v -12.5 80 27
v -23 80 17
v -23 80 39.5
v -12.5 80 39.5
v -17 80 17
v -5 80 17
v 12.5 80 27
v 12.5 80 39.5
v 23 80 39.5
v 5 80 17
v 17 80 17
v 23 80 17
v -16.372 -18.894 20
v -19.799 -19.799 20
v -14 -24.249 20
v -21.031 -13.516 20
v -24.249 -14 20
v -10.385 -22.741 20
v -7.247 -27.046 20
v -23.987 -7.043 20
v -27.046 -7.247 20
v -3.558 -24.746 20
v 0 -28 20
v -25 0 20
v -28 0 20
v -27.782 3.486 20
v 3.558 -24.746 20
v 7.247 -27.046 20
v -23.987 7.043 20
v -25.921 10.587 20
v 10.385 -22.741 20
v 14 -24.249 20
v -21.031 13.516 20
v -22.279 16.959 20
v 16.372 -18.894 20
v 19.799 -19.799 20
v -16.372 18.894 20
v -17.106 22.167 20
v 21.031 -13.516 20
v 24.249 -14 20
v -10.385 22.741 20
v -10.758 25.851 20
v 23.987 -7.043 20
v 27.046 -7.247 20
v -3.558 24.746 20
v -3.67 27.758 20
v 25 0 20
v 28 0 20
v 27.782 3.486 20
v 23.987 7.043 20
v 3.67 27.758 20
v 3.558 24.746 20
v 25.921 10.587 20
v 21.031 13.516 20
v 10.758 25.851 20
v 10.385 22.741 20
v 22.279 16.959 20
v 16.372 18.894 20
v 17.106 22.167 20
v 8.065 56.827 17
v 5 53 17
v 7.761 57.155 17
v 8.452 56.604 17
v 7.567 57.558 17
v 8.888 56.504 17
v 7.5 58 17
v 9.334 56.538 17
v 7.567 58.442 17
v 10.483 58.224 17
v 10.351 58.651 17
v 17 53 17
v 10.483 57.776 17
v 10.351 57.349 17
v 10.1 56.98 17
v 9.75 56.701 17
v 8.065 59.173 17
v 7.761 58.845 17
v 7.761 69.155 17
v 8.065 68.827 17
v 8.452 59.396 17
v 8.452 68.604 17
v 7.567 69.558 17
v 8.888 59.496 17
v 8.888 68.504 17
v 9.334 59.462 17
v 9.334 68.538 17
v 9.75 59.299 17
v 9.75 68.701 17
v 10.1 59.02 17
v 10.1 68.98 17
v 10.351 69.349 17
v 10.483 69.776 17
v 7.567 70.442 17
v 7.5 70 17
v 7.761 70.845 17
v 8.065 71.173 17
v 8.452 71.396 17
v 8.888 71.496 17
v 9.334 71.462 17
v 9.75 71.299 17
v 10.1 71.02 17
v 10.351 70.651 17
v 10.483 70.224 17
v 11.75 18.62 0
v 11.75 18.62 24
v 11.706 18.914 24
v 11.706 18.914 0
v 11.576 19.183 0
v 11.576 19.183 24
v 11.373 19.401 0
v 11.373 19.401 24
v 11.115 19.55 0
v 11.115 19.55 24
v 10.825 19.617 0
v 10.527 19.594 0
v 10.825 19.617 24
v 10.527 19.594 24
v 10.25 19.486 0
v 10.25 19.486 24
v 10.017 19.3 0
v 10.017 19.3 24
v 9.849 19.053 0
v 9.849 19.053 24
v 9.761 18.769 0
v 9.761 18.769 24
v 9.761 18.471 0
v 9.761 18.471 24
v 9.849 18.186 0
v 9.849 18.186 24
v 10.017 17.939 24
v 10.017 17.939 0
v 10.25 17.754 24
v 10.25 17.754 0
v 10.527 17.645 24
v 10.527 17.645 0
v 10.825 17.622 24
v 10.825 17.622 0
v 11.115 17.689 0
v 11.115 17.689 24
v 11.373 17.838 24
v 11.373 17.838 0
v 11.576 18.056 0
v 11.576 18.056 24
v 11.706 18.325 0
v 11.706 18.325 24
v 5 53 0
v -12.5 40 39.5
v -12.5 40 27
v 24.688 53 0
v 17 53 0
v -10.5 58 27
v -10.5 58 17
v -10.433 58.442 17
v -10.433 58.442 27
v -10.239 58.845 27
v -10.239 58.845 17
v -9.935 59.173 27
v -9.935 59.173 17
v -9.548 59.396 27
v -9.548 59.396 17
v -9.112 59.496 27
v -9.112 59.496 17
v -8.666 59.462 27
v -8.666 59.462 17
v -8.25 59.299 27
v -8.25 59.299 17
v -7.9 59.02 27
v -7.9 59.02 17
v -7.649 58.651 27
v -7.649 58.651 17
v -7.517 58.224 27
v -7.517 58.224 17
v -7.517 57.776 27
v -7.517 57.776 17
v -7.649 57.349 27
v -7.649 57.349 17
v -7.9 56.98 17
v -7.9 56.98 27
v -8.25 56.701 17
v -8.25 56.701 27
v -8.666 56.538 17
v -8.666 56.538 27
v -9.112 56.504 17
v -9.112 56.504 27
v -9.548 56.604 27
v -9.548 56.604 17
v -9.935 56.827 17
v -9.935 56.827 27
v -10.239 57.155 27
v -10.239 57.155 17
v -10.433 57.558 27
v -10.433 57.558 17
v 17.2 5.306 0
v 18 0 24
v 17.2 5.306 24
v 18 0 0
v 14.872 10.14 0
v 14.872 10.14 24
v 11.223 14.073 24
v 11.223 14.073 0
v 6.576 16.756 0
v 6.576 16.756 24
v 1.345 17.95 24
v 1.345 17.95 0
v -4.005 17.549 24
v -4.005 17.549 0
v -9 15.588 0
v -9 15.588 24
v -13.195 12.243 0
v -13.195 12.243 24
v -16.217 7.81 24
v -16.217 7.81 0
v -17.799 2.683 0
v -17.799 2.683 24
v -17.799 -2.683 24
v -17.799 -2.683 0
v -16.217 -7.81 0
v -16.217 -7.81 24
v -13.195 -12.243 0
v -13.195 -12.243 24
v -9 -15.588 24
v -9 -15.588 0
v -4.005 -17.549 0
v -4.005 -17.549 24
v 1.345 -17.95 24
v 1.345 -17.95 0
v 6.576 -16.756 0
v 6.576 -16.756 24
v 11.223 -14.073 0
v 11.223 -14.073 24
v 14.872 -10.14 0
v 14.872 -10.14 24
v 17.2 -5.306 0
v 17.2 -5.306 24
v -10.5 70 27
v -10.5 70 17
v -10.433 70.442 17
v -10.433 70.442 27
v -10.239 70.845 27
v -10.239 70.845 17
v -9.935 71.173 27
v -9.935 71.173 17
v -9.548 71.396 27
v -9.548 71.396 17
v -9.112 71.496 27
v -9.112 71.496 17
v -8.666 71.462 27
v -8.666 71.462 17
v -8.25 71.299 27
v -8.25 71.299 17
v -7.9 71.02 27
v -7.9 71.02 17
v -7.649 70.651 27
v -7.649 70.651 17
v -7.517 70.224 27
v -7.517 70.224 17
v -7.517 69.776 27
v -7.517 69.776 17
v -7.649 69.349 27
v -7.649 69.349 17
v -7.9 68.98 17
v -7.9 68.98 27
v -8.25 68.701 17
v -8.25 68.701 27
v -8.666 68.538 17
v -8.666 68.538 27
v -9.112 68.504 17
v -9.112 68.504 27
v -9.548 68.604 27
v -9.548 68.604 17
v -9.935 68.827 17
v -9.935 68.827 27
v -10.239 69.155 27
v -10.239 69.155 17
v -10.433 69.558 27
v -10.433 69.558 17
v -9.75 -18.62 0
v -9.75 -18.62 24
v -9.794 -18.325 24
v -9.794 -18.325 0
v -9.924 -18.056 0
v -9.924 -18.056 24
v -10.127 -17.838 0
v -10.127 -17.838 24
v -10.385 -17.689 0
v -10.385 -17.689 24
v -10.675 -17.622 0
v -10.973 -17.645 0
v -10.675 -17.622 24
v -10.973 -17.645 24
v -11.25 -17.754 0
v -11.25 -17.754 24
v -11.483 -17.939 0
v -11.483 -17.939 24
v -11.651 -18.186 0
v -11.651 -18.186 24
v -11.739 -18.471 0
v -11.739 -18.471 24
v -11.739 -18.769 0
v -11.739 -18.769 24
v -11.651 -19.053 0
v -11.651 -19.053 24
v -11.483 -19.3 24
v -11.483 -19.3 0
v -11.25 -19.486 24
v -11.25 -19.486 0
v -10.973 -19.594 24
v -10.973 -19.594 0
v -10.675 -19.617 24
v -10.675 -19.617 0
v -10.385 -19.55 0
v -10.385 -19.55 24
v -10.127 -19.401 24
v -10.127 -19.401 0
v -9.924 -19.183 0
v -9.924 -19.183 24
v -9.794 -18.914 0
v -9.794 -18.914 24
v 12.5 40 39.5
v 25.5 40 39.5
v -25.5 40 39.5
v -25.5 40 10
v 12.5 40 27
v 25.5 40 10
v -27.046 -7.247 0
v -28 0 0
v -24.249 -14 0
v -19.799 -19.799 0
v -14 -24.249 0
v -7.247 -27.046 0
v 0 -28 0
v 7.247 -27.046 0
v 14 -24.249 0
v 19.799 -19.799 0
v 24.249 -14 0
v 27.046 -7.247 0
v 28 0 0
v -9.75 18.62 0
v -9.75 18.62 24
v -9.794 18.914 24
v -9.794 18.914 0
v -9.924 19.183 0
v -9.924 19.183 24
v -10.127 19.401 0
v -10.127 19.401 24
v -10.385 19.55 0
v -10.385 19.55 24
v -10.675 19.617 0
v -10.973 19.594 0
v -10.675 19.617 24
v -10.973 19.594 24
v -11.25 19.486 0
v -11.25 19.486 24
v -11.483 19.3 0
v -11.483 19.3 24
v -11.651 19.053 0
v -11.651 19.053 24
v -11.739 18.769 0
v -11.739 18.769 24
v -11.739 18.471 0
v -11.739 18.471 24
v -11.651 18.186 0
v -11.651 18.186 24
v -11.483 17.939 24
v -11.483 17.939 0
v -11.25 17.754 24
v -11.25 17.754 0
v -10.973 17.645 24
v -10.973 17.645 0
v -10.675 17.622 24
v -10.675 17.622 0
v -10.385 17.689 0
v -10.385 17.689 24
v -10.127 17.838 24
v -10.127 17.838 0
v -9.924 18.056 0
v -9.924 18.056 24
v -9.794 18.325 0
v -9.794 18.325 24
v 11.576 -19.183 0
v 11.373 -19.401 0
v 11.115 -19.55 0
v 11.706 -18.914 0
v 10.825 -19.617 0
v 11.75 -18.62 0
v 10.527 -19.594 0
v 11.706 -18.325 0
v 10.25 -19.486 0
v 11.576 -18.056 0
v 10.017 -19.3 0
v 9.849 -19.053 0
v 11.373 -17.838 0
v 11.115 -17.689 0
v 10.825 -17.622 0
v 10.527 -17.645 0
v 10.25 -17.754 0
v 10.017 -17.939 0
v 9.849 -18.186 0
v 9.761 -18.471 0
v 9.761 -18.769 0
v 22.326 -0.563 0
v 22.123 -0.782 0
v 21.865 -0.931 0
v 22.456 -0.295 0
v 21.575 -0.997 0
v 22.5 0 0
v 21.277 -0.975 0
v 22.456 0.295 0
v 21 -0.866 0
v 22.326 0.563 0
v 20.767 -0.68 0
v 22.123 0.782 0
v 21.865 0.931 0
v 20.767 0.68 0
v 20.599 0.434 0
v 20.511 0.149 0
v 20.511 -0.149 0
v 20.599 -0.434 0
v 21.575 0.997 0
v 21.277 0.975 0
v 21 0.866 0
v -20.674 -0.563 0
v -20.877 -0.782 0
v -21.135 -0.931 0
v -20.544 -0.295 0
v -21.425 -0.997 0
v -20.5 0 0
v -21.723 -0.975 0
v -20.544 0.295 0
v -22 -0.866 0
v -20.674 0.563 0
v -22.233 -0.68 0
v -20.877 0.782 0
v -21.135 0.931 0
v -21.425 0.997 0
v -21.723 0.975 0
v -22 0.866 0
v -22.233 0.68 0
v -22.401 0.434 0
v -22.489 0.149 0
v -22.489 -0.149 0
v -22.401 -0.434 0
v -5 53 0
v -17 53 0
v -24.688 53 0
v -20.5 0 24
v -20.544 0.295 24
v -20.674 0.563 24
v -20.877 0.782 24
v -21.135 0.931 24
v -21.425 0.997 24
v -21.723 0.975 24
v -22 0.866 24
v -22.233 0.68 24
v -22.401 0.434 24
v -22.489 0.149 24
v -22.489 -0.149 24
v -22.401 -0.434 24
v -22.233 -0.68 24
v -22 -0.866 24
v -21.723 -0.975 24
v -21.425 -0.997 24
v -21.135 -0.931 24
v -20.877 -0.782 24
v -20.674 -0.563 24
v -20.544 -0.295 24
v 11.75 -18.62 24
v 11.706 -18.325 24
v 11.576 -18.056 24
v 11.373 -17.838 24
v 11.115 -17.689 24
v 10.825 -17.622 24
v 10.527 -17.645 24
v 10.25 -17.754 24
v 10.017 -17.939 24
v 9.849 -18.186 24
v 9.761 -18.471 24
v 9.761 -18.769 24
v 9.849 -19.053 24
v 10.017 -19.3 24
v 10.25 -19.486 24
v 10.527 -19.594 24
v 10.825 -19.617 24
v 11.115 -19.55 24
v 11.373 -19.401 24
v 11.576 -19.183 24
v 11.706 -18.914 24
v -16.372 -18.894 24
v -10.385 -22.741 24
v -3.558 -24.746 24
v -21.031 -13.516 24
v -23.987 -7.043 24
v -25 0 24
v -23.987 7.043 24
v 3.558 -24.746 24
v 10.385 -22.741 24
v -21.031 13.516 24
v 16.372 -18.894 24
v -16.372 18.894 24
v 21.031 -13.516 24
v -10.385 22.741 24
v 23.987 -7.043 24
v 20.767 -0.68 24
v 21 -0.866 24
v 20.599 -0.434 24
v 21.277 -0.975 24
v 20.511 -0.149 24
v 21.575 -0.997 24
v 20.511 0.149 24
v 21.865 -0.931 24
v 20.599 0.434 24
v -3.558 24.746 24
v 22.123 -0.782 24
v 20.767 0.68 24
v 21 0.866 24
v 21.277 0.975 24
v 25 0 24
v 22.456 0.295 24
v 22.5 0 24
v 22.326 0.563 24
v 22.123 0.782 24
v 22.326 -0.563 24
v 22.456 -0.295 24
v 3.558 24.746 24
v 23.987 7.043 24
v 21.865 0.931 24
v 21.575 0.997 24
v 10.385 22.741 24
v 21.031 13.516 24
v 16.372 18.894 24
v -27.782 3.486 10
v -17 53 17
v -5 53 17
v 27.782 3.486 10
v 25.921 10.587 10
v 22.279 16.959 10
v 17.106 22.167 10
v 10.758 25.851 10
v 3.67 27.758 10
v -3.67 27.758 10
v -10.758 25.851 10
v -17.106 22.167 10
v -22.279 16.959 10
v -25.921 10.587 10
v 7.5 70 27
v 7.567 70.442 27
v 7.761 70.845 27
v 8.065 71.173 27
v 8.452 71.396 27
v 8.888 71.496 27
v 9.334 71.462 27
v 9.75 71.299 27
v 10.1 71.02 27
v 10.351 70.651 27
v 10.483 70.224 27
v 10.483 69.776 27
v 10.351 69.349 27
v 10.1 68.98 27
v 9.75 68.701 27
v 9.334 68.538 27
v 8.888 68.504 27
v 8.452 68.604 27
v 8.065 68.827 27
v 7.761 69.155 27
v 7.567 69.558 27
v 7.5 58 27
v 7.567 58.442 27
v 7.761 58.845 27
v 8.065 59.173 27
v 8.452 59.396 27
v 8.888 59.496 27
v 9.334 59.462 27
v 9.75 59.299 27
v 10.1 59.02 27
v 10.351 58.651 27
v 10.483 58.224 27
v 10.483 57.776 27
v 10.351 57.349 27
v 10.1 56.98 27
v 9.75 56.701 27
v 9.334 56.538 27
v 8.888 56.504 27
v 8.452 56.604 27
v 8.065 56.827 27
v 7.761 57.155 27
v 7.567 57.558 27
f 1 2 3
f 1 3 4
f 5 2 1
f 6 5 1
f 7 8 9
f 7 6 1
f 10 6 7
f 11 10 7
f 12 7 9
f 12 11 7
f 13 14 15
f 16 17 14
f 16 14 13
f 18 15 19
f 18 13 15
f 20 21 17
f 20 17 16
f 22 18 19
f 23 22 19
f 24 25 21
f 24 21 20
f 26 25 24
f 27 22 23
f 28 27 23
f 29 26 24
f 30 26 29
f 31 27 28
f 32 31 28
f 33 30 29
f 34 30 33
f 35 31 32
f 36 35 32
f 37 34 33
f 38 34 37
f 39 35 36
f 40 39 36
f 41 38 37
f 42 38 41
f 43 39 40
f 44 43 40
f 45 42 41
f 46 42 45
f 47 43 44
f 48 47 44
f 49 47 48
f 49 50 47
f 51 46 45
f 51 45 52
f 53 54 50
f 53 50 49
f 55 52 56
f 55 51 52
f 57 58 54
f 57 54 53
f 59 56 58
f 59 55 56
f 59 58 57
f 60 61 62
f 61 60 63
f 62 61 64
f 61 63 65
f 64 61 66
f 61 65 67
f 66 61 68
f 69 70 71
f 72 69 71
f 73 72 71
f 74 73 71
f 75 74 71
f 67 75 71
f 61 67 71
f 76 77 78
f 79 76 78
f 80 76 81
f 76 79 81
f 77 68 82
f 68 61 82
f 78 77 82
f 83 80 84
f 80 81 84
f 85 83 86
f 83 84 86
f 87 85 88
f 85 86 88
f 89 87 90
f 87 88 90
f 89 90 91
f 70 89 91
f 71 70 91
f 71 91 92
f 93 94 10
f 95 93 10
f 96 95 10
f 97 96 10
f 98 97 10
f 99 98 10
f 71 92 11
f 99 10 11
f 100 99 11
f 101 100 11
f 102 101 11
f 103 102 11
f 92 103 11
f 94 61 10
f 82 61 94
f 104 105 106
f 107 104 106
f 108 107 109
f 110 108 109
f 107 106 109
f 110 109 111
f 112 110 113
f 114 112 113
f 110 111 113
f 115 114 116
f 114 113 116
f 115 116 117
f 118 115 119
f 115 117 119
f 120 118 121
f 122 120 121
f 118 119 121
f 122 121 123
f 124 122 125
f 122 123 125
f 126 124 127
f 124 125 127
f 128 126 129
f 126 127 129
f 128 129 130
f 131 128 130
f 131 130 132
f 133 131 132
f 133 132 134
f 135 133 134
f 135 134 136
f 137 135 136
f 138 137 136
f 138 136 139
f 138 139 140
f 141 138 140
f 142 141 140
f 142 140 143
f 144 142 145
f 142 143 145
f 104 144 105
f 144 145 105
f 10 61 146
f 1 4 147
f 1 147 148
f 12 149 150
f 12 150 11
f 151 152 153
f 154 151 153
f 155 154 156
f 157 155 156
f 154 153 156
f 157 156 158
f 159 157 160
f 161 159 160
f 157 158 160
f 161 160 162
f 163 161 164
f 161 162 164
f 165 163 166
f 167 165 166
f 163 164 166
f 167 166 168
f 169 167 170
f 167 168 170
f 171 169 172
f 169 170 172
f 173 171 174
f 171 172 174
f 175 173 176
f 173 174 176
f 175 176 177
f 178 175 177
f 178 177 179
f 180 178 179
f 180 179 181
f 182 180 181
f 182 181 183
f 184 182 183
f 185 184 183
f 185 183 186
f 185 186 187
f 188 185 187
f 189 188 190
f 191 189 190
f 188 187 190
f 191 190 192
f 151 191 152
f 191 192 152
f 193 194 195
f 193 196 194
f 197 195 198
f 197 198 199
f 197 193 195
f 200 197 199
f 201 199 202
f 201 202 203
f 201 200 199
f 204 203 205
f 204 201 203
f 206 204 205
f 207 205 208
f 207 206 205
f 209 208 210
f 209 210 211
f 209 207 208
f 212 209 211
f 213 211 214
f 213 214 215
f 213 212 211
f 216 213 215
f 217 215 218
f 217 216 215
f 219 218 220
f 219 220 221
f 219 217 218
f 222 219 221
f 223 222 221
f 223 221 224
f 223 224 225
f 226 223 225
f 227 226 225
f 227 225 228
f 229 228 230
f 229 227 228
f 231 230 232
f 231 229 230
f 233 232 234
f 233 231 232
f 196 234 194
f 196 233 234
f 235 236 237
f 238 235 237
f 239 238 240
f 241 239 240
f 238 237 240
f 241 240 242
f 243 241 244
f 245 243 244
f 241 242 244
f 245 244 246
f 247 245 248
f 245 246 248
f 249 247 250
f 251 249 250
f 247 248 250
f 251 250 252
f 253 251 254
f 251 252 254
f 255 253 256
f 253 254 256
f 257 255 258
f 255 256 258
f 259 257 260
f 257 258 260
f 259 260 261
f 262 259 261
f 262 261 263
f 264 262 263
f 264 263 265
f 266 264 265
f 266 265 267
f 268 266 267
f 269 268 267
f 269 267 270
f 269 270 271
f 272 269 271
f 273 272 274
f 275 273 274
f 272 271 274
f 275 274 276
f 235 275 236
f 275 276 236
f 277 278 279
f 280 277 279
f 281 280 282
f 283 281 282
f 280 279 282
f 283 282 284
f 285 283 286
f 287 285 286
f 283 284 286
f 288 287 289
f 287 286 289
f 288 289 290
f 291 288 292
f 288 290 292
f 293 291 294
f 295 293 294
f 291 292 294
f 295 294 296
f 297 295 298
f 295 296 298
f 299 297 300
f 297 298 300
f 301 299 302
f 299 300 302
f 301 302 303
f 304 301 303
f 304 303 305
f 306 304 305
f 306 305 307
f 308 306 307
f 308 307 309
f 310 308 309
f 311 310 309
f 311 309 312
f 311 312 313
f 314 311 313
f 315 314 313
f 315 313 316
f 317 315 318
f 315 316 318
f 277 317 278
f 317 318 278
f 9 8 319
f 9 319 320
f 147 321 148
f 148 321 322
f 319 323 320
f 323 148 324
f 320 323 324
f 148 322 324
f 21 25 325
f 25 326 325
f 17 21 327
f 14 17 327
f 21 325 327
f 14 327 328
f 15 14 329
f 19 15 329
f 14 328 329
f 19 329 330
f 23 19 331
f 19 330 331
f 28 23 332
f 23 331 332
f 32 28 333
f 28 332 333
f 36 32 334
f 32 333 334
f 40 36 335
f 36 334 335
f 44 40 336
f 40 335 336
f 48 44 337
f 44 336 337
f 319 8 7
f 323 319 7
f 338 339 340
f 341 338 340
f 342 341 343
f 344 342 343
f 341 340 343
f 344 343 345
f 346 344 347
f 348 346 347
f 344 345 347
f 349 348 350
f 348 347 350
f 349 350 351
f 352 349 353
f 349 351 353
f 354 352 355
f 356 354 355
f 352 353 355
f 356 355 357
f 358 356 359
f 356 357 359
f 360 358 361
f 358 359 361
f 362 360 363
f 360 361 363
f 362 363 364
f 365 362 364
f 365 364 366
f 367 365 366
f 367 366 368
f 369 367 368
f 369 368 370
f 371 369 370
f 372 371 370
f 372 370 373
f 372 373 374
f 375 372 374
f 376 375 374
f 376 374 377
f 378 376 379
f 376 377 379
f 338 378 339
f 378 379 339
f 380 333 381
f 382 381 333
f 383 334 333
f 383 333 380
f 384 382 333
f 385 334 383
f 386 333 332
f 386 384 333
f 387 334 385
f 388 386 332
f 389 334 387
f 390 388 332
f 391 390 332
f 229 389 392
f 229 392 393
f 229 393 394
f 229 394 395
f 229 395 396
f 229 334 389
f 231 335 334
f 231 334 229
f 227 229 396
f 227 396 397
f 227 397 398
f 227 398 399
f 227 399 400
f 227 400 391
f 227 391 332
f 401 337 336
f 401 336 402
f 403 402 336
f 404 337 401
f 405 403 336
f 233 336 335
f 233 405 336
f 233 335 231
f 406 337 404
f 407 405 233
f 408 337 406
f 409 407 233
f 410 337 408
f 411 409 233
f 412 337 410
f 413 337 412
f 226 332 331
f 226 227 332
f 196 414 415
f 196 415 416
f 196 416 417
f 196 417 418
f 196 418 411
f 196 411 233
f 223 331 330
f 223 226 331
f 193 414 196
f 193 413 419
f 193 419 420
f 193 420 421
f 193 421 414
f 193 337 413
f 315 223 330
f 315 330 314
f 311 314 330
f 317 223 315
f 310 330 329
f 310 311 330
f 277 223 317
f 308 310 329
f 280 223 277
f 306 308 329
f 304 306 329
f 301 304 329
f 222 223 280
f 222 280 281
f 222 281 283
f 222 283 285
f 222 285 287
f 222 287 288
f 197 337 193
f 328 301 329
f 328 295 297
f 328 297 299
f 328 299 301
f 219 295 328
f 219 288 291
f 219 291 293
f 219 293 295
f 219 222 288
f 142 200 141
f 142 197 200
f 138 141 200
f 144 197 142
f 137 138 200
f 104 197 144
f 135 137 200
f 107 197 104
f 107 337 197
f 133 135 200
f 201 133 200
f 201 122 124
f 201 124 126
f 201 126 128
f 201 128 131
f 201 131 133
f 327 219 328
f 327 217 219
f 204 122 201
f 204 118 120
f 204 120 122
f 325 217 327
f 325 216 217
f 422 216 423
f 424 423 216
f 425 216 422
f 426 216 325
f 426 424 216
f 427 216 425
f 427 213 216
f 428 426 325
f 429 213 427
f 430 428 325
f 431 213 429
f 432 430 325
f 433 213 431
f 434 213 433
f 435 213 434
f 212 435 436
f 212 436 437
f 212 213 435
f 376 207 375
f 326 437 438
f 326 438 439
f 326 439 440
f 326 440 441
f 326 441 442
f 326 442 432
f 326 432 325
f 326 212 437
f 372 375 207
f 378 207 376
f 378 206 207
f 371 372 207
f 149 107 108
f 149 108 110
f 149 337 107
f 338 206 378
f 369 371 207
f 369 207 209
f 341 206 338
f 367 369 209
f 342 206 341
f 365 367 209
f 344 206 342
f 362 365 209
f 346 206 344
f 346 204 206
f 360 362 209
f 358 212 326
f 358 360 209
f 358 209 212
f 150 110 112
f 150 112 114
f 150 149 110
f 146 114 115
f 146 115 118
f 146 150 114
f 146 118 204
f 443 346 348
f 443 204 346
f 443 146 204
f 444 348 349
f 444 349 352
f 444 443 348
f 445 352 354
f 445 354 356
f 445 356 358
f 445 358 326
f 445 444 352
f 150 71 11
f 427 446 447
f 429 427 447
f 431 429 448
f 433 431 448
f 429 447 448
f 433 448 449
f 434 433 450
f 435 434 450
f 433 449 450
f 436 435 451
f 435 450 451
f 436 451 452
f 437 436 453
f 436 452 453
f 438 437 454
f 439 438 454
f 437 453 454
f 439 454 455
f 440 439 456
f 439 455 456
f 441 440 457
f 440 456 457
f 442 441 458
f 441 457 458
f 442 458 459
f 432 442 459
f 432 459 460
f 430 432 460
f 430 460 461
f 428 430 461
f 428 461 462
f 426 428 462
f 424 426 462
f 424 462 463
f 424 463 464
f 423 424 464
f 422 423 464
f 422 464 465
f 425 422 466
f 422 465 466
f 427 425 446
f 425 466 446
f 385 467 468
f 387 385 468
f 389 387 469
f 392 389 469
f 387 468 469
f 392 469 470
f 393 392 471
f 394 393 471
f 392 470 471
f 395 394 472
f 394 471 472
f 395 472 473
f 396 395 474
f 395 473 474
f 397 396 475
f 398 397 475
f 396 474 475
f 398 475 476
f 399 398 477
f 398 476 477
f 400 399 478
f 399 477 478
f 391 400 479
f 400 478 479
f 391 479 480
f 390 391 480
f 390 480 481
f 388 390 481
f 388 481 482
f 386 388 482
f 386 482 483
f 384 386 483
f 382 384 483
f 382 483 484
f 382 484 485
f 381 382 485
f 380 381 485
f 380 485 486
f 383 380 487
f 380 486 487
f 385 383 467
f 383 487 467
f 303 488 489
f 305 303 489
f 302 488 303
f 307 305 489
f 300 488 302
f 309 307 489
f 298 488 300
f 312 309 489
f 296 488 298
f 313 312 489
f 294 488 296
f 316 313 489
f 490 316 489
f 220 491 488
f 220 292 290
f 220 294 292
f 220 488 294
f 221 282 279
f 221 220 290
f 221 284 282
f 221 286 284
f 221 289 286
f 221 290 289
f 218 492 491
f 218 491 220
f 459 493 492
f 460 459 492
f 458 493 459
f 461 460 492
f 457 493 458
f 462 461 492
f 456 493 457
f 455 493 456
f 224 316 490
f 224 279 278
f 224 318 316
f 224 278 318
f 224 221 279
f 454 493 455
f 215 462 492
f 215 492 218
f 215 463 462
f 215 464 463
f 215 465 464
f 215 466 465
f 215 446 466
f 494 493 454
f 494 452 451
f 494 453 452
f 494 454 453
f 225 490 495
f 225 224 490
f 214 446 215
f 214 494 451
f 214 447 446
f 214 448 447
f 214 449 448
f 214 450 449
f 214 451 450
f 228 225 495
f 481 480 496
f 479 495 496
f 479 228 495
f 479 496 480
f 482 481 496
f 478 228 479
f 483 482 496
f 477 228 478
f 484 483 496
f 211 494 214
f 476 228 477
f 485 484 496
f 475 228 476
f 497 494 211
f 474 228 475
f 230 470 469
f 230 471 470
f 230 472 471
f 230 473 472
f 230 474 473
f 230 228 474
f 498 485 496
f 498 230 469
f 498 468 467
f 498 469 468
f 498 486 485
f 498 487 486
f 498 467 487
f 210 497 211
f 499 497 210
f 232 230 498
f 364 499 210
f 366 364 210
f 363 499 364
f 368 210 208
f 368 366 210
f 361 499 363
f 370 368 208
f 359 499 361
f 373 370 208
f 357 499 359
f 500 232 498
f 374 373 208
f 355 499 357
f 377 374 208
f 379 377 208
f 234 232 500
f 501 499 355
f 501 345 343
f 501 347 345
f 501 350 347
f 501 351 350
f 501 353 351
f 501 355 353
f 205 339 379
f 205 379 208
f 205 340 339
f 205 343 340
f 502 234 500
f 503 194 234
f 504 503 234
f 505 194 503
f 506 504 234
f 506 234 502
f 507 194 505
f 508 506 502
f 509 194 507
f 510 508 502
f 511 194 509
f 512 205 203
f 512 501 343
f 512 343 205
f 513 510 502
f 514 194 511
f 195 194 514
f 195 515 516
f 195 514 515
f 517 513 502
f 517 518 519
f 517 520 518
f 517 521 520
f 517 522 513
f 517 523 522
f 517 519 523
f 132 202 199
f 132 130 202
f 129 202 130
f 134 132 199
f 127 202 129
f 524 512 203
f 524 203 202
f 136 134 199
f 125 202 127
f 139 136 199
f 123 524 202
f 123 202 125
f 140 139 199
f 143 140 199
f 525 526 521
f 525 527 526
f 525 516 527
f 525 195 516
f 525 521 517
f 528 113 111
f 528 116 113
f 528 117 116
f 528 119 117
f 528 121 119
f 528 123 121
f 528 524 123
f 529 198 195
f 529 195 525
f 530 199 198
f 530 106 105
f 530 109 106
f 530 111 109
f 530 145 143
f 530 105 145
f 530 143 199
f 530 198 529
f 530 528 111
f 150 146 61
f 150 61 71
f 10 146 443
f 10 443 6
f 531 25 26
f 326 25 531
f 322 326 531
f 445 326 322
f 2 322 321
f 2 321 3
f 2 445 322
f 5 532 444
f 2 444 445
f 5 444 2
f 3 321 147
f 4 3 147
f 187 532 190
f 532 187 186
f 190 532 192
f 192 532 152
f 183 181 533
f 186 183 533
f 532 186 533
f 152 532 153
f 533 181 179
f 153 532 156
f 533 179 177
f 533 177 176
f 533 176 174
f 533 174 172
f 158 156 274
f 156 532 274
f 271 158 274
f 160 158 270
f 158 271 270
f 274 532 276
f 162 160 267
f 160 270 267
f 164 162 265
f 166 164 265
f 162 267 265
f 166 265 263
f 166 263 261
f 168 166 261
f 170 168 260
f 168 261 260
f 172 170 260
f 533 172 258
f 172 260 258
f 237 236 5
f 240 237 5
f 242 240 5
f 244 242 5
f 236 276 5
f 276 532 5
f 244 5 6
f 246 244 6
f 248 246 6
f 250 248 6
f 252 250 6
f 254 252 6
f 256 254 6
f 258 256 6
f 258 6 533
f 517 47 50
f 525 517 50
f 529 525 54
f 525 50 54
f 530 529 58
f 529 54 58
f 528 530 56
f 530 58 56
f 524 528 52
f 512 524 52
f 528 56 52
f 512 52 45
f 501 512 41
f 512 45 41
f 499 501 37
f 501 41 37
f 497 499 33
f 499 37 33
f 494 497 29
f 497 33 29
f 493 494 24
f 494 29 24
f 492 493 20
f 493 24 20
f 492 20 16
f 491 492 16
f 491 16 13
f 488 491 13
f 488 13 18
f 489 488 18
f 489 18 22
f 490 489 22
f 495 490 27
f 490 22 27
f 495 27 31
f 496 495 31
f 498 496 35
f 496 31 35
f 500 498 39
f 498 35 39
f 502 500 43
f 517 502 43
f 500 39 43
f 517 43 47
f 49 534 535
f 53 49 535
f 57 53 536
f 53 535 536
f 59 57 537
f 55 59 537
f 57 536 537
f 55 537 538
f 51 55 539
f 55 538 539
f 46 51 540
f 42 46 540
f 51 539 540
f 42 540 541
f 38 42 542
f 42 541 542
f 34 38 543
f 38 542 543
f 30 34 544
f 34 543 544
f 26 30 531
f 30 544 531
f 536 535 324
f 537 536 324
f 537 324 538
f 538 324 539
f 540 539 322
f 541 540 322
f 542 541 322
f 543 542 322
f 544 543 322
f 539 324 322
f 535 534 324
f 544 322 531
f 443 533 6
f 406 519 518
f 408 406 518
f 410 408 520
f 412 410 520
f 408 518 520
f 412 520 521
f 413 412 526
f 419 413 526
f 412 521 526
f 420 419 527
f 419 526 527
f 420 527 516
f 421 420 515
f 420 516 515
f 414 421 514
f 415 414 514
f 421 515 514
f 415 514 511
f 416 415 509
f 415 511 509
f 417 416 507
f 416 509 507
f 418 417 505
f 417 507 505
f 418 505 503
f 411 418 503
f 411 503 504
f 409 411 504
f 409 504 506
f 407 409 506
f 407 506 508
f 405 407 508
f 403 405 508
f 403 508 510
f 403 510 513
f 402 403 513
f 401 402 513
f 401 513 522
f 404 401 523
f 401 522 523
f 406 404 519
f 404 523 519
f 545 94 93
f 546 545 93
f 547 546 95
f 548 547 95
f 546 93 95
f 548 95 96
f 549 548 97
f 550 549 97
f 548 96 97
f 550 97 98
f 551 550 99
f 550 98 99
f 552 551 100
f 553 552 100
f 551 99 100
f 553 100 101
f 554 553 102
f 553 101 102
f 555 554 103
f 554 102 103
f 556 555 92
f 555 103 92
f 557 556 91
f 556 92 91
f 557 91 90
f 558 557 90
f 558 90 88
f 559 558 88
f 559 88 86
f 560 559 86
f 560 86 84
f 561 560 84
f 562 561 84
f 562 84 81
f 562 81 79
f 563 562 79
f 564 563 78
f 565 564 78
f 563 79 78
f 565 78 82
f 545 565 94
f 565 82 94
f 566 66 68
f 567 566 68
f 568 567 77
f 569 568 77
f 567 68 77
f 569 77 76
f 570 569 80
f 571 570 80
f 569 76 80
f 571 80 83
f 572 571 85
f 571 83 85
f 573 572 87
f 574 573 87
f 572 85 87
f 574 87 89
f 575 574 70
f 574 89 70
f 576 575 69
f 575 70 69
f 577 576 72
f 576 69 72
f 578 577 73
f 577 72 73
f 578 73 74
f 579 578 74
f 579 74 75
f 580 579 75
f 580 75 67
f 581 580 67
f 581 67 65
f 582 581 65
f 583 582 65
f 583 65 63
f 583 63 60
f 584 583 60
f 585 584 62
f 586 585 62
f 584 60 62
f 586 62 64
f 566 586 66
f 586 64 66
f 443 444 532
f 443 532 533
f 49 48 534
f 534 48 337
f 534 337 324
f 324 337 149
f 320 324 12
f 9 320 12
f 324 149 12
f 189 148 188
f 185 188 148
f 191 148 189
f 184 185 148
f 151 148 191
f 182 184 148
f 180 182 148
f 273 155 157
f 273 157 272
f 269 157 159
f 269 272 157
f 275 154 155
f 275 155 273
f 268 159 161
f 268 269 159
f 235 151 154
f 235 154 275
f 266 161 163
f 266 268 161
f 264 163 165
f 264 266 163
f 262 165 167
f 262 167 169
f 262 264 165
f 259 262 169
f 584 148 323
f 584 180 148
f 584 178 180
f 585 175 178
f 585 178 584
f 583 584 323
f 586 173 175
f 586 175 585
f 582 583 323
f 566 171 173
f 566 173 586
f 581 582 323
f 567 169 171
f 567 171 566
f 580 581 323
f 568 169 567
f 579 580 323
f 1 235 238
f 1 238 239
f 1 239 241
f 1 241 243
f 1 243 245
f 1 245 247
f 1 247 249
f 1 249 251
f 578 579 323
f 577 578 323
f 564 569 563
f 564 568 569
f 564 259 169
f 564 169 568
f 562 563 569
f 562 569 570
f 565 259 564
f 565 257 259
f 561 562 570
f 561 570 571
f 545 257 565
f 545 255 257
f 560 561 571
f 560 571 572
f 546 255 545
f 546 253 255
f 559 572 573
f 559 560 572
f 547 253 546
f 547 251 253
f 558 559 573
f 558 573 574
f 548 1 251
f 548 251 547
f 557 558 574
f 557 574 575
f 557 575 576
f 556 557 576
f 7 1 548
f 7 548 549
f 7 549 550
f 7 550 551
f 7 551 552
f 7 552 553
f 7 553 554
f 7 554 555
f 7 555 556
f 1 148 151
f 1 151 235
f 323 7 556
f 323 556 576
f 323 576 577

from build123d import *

# Parameters (mm, degrees)
SKETCH1_R               = 28
SKETCH1_R_2             = 18
BOSS_EXTRUDE1_DEPTH     = 10
SKETCH5_R               = 28
SKETCH5_R_2             = 18
BOSS_EXTRUDE6_DEPTH     = 10
SKETCH6_R               = 25
SKETCH6_R_2             = 18
BOSS_EXTRUDE7_DEPTH     = 4
SKETCH7_R               = 1
CUT_EXTRUDE1_DEPTH      = 24
SKETCH8_W               = 56
SKETCH8_H               = 40
BOSS_EXTRUDE8_DEPTH     = 29.5
SKETCH9_W               = 25
SKETCH9_H               = 12.5
CUT_EXTRUDE2_DEPTH      = 45
SKETCH10_W              = 12
SKETCH10_H              = 17
CUT_EXTRUDE3_DEPTH      = 27
CUT_EXTRUDE4_DEPTH      = 42
CUT_EXTRUDE4_DEPTH_BACK = 16
CUT_EXTRUDE5_DEPTH      = 40
SKETCH14_R              = 1.5
CUT_EXTRUDE6_DEPTH      = 10


with BuildPart() as part:
    # Sketch1 → Boss-Extrude1 (new body)
    # profile 1 of 2: a face of its own
    with BuildSketch(Plane.XY):
        Circle(SKETCH1_R)
        Circle(SKETCH1_R_2, mode=Mode.SUBTRACT)
    # profile 2 of 2: a face of its own
    with BuildSketch(Plane.XY):
        with BuildLine():
            Line((-28, 80), (28, 80))
            Line((28, 80), (28, 0))
            ThreePointArc((28, 0), (0, 28), (-28, 0))
            Line((-28, 0), (-28, 80))
        make_face()
    extrude(amount=BOSS_EXTRUDE1_DEPTH)

    # Sketch5 → Boss-Extrude6 (add)
    with BuildSketch(Plane.XY.offset(10)):
        Circle(SKETCH5_R)
        Circle(SKETCH5_R_2, mode=Mode.SUBTRACT)
    extrude(amount=BOSS_EXTRUDE6_DEPTH)

    # Sketch6 → Boss-Extrude7 (add)
    with BuildSketch(Plane.XY.offset(20)):
        Circle(SKETCH6_R)
        Circle(SKETCH6_R_2, mode=Mode.SUBTRACT)
    extrude(amount=BOSS_EXTRUDE7_DEPTH)

    # Sketch7 → Cut-Extrude1 (cut)
    with BuildSketch(Plane.XY.offset(24)):
        with Locations((-10.75, 18.619546181)):
            Circle(SKETCH7_R)
        with Locations((10.75, 18.619546181)):
            Circle(SKETCH7_R)
        with Locations((21.5, 0)):
            Circle(SKETCH7_R)
        with Locations((10.75, -18.619546181)):
            Circle(SKETCH7_R)
        with Locations((-10.75, -18.619546181)):
            Circle(SKETCH7_R)
        with Locations((-21.5, 0)):
            Circle(SKETCH7_R)
    extrude(amount=-CUT_EXTRUDE1_DEPTH, mode=Mode.SUBTRACT)

    # Sketch8 → Boss-Extrude8 (add)
    with BuildSketch(Plane.XY.offset(10)):
        with Locations((0, 60)):
            Rectangle(SKETCH8_W, SKETCH8_H)
    extrude(amount=BOSS_EXTRUDE8_DEPTH)

    # Sketch9 → Cut-Extrude2 (cut)
    with BuildSketch(Plane(origin=(0, 80, 0), x_dir=(1, 0, 0), z_dir=(0, 1, 0))):
        with Locations((0, -33.25)):
            Rectangle(SKETCH9_W, SKETCH9_H)
    extrude(amount=-CUT_EXTRUDE2_DEPTH, mode=Mode.SUBTRACT)

    # Sketch10 → Cut-Extrude3 (cut)
    with BuildSketch(Plane(origin=(0, 80, 0), x_dir=(1, 0, 0), z_dir=(0, 1, 0))):
        with Locations((11, -8.5)):
            Rectangle(SKETCH10_W, SKETCH10_H)
        with Locations((-11, -8.5)):
            Rectangle(SKETCH10_W, SKETCH10_H)
    extrude(amount=-CUT_EXTRUDE3_DEPTH, mode=Mode.SUBTRACT)

    # Sketch11 → Cut-Extrude4 (cut, two sides: drawn at the far end of the back side and taken through both)
    with BuildSketch(Plane.ZY.offset(-17).offset(-CUT_EXTRUDE4_DEPTH_BACK)):
        Polygon((0, 53), (17, 80), (0, 80), align=None)
    extrude(amount=CUT_EXTRUDE4_DEPTH + CUT_EXTRUDE4_DEPTH_BACK, mode=Mode.SUBTRACT)

    # Sketch13 → Cut-Extrude5 (cut)
    with BuildSketch(Plane(origin=(0, 0, 0), x_dir=(-1, 0, 0), z_dir=(0, 0, -1))):
        Polygon((28, 80), (28, 0), (23, 80), align=None)
    cut_extrude5 = extrude(amount=-CUT_EXTRUDE5_DEPTH, mode=Mode.SUBTRACT)

    # Mirror1: Cut-Extrude5 across plane
    add(cut_extrude5.mirror(Plane(origin=(0, 0, 0), x_dir=(0, 0, 1), z_dir=(1, 0, 0))), mode=Mode.SUBTRACT)

    # Sketch14 → Cut-Extrude6 (cut)
    with BuildSketch(Plane(origin=(0, 0, 17), x_dir=(-1, 0, 0), z_dir=(0, 0, -1))):
        with Locations((-9, 70)):
            Circle(SKETCH14_R)
        with Locations((-9, 58)):
            Circle(SKETCH14_R)
        with Locations((9, 70)):
            Circle(SKETCH14_R)
        with Locations((9, 58)):
            Circle(SKETCH14_R)
    extrude(amount=-CUT_EXTRUDE6_DEPTH, mode=Mode.SUBTRACT)


solid = part.part
